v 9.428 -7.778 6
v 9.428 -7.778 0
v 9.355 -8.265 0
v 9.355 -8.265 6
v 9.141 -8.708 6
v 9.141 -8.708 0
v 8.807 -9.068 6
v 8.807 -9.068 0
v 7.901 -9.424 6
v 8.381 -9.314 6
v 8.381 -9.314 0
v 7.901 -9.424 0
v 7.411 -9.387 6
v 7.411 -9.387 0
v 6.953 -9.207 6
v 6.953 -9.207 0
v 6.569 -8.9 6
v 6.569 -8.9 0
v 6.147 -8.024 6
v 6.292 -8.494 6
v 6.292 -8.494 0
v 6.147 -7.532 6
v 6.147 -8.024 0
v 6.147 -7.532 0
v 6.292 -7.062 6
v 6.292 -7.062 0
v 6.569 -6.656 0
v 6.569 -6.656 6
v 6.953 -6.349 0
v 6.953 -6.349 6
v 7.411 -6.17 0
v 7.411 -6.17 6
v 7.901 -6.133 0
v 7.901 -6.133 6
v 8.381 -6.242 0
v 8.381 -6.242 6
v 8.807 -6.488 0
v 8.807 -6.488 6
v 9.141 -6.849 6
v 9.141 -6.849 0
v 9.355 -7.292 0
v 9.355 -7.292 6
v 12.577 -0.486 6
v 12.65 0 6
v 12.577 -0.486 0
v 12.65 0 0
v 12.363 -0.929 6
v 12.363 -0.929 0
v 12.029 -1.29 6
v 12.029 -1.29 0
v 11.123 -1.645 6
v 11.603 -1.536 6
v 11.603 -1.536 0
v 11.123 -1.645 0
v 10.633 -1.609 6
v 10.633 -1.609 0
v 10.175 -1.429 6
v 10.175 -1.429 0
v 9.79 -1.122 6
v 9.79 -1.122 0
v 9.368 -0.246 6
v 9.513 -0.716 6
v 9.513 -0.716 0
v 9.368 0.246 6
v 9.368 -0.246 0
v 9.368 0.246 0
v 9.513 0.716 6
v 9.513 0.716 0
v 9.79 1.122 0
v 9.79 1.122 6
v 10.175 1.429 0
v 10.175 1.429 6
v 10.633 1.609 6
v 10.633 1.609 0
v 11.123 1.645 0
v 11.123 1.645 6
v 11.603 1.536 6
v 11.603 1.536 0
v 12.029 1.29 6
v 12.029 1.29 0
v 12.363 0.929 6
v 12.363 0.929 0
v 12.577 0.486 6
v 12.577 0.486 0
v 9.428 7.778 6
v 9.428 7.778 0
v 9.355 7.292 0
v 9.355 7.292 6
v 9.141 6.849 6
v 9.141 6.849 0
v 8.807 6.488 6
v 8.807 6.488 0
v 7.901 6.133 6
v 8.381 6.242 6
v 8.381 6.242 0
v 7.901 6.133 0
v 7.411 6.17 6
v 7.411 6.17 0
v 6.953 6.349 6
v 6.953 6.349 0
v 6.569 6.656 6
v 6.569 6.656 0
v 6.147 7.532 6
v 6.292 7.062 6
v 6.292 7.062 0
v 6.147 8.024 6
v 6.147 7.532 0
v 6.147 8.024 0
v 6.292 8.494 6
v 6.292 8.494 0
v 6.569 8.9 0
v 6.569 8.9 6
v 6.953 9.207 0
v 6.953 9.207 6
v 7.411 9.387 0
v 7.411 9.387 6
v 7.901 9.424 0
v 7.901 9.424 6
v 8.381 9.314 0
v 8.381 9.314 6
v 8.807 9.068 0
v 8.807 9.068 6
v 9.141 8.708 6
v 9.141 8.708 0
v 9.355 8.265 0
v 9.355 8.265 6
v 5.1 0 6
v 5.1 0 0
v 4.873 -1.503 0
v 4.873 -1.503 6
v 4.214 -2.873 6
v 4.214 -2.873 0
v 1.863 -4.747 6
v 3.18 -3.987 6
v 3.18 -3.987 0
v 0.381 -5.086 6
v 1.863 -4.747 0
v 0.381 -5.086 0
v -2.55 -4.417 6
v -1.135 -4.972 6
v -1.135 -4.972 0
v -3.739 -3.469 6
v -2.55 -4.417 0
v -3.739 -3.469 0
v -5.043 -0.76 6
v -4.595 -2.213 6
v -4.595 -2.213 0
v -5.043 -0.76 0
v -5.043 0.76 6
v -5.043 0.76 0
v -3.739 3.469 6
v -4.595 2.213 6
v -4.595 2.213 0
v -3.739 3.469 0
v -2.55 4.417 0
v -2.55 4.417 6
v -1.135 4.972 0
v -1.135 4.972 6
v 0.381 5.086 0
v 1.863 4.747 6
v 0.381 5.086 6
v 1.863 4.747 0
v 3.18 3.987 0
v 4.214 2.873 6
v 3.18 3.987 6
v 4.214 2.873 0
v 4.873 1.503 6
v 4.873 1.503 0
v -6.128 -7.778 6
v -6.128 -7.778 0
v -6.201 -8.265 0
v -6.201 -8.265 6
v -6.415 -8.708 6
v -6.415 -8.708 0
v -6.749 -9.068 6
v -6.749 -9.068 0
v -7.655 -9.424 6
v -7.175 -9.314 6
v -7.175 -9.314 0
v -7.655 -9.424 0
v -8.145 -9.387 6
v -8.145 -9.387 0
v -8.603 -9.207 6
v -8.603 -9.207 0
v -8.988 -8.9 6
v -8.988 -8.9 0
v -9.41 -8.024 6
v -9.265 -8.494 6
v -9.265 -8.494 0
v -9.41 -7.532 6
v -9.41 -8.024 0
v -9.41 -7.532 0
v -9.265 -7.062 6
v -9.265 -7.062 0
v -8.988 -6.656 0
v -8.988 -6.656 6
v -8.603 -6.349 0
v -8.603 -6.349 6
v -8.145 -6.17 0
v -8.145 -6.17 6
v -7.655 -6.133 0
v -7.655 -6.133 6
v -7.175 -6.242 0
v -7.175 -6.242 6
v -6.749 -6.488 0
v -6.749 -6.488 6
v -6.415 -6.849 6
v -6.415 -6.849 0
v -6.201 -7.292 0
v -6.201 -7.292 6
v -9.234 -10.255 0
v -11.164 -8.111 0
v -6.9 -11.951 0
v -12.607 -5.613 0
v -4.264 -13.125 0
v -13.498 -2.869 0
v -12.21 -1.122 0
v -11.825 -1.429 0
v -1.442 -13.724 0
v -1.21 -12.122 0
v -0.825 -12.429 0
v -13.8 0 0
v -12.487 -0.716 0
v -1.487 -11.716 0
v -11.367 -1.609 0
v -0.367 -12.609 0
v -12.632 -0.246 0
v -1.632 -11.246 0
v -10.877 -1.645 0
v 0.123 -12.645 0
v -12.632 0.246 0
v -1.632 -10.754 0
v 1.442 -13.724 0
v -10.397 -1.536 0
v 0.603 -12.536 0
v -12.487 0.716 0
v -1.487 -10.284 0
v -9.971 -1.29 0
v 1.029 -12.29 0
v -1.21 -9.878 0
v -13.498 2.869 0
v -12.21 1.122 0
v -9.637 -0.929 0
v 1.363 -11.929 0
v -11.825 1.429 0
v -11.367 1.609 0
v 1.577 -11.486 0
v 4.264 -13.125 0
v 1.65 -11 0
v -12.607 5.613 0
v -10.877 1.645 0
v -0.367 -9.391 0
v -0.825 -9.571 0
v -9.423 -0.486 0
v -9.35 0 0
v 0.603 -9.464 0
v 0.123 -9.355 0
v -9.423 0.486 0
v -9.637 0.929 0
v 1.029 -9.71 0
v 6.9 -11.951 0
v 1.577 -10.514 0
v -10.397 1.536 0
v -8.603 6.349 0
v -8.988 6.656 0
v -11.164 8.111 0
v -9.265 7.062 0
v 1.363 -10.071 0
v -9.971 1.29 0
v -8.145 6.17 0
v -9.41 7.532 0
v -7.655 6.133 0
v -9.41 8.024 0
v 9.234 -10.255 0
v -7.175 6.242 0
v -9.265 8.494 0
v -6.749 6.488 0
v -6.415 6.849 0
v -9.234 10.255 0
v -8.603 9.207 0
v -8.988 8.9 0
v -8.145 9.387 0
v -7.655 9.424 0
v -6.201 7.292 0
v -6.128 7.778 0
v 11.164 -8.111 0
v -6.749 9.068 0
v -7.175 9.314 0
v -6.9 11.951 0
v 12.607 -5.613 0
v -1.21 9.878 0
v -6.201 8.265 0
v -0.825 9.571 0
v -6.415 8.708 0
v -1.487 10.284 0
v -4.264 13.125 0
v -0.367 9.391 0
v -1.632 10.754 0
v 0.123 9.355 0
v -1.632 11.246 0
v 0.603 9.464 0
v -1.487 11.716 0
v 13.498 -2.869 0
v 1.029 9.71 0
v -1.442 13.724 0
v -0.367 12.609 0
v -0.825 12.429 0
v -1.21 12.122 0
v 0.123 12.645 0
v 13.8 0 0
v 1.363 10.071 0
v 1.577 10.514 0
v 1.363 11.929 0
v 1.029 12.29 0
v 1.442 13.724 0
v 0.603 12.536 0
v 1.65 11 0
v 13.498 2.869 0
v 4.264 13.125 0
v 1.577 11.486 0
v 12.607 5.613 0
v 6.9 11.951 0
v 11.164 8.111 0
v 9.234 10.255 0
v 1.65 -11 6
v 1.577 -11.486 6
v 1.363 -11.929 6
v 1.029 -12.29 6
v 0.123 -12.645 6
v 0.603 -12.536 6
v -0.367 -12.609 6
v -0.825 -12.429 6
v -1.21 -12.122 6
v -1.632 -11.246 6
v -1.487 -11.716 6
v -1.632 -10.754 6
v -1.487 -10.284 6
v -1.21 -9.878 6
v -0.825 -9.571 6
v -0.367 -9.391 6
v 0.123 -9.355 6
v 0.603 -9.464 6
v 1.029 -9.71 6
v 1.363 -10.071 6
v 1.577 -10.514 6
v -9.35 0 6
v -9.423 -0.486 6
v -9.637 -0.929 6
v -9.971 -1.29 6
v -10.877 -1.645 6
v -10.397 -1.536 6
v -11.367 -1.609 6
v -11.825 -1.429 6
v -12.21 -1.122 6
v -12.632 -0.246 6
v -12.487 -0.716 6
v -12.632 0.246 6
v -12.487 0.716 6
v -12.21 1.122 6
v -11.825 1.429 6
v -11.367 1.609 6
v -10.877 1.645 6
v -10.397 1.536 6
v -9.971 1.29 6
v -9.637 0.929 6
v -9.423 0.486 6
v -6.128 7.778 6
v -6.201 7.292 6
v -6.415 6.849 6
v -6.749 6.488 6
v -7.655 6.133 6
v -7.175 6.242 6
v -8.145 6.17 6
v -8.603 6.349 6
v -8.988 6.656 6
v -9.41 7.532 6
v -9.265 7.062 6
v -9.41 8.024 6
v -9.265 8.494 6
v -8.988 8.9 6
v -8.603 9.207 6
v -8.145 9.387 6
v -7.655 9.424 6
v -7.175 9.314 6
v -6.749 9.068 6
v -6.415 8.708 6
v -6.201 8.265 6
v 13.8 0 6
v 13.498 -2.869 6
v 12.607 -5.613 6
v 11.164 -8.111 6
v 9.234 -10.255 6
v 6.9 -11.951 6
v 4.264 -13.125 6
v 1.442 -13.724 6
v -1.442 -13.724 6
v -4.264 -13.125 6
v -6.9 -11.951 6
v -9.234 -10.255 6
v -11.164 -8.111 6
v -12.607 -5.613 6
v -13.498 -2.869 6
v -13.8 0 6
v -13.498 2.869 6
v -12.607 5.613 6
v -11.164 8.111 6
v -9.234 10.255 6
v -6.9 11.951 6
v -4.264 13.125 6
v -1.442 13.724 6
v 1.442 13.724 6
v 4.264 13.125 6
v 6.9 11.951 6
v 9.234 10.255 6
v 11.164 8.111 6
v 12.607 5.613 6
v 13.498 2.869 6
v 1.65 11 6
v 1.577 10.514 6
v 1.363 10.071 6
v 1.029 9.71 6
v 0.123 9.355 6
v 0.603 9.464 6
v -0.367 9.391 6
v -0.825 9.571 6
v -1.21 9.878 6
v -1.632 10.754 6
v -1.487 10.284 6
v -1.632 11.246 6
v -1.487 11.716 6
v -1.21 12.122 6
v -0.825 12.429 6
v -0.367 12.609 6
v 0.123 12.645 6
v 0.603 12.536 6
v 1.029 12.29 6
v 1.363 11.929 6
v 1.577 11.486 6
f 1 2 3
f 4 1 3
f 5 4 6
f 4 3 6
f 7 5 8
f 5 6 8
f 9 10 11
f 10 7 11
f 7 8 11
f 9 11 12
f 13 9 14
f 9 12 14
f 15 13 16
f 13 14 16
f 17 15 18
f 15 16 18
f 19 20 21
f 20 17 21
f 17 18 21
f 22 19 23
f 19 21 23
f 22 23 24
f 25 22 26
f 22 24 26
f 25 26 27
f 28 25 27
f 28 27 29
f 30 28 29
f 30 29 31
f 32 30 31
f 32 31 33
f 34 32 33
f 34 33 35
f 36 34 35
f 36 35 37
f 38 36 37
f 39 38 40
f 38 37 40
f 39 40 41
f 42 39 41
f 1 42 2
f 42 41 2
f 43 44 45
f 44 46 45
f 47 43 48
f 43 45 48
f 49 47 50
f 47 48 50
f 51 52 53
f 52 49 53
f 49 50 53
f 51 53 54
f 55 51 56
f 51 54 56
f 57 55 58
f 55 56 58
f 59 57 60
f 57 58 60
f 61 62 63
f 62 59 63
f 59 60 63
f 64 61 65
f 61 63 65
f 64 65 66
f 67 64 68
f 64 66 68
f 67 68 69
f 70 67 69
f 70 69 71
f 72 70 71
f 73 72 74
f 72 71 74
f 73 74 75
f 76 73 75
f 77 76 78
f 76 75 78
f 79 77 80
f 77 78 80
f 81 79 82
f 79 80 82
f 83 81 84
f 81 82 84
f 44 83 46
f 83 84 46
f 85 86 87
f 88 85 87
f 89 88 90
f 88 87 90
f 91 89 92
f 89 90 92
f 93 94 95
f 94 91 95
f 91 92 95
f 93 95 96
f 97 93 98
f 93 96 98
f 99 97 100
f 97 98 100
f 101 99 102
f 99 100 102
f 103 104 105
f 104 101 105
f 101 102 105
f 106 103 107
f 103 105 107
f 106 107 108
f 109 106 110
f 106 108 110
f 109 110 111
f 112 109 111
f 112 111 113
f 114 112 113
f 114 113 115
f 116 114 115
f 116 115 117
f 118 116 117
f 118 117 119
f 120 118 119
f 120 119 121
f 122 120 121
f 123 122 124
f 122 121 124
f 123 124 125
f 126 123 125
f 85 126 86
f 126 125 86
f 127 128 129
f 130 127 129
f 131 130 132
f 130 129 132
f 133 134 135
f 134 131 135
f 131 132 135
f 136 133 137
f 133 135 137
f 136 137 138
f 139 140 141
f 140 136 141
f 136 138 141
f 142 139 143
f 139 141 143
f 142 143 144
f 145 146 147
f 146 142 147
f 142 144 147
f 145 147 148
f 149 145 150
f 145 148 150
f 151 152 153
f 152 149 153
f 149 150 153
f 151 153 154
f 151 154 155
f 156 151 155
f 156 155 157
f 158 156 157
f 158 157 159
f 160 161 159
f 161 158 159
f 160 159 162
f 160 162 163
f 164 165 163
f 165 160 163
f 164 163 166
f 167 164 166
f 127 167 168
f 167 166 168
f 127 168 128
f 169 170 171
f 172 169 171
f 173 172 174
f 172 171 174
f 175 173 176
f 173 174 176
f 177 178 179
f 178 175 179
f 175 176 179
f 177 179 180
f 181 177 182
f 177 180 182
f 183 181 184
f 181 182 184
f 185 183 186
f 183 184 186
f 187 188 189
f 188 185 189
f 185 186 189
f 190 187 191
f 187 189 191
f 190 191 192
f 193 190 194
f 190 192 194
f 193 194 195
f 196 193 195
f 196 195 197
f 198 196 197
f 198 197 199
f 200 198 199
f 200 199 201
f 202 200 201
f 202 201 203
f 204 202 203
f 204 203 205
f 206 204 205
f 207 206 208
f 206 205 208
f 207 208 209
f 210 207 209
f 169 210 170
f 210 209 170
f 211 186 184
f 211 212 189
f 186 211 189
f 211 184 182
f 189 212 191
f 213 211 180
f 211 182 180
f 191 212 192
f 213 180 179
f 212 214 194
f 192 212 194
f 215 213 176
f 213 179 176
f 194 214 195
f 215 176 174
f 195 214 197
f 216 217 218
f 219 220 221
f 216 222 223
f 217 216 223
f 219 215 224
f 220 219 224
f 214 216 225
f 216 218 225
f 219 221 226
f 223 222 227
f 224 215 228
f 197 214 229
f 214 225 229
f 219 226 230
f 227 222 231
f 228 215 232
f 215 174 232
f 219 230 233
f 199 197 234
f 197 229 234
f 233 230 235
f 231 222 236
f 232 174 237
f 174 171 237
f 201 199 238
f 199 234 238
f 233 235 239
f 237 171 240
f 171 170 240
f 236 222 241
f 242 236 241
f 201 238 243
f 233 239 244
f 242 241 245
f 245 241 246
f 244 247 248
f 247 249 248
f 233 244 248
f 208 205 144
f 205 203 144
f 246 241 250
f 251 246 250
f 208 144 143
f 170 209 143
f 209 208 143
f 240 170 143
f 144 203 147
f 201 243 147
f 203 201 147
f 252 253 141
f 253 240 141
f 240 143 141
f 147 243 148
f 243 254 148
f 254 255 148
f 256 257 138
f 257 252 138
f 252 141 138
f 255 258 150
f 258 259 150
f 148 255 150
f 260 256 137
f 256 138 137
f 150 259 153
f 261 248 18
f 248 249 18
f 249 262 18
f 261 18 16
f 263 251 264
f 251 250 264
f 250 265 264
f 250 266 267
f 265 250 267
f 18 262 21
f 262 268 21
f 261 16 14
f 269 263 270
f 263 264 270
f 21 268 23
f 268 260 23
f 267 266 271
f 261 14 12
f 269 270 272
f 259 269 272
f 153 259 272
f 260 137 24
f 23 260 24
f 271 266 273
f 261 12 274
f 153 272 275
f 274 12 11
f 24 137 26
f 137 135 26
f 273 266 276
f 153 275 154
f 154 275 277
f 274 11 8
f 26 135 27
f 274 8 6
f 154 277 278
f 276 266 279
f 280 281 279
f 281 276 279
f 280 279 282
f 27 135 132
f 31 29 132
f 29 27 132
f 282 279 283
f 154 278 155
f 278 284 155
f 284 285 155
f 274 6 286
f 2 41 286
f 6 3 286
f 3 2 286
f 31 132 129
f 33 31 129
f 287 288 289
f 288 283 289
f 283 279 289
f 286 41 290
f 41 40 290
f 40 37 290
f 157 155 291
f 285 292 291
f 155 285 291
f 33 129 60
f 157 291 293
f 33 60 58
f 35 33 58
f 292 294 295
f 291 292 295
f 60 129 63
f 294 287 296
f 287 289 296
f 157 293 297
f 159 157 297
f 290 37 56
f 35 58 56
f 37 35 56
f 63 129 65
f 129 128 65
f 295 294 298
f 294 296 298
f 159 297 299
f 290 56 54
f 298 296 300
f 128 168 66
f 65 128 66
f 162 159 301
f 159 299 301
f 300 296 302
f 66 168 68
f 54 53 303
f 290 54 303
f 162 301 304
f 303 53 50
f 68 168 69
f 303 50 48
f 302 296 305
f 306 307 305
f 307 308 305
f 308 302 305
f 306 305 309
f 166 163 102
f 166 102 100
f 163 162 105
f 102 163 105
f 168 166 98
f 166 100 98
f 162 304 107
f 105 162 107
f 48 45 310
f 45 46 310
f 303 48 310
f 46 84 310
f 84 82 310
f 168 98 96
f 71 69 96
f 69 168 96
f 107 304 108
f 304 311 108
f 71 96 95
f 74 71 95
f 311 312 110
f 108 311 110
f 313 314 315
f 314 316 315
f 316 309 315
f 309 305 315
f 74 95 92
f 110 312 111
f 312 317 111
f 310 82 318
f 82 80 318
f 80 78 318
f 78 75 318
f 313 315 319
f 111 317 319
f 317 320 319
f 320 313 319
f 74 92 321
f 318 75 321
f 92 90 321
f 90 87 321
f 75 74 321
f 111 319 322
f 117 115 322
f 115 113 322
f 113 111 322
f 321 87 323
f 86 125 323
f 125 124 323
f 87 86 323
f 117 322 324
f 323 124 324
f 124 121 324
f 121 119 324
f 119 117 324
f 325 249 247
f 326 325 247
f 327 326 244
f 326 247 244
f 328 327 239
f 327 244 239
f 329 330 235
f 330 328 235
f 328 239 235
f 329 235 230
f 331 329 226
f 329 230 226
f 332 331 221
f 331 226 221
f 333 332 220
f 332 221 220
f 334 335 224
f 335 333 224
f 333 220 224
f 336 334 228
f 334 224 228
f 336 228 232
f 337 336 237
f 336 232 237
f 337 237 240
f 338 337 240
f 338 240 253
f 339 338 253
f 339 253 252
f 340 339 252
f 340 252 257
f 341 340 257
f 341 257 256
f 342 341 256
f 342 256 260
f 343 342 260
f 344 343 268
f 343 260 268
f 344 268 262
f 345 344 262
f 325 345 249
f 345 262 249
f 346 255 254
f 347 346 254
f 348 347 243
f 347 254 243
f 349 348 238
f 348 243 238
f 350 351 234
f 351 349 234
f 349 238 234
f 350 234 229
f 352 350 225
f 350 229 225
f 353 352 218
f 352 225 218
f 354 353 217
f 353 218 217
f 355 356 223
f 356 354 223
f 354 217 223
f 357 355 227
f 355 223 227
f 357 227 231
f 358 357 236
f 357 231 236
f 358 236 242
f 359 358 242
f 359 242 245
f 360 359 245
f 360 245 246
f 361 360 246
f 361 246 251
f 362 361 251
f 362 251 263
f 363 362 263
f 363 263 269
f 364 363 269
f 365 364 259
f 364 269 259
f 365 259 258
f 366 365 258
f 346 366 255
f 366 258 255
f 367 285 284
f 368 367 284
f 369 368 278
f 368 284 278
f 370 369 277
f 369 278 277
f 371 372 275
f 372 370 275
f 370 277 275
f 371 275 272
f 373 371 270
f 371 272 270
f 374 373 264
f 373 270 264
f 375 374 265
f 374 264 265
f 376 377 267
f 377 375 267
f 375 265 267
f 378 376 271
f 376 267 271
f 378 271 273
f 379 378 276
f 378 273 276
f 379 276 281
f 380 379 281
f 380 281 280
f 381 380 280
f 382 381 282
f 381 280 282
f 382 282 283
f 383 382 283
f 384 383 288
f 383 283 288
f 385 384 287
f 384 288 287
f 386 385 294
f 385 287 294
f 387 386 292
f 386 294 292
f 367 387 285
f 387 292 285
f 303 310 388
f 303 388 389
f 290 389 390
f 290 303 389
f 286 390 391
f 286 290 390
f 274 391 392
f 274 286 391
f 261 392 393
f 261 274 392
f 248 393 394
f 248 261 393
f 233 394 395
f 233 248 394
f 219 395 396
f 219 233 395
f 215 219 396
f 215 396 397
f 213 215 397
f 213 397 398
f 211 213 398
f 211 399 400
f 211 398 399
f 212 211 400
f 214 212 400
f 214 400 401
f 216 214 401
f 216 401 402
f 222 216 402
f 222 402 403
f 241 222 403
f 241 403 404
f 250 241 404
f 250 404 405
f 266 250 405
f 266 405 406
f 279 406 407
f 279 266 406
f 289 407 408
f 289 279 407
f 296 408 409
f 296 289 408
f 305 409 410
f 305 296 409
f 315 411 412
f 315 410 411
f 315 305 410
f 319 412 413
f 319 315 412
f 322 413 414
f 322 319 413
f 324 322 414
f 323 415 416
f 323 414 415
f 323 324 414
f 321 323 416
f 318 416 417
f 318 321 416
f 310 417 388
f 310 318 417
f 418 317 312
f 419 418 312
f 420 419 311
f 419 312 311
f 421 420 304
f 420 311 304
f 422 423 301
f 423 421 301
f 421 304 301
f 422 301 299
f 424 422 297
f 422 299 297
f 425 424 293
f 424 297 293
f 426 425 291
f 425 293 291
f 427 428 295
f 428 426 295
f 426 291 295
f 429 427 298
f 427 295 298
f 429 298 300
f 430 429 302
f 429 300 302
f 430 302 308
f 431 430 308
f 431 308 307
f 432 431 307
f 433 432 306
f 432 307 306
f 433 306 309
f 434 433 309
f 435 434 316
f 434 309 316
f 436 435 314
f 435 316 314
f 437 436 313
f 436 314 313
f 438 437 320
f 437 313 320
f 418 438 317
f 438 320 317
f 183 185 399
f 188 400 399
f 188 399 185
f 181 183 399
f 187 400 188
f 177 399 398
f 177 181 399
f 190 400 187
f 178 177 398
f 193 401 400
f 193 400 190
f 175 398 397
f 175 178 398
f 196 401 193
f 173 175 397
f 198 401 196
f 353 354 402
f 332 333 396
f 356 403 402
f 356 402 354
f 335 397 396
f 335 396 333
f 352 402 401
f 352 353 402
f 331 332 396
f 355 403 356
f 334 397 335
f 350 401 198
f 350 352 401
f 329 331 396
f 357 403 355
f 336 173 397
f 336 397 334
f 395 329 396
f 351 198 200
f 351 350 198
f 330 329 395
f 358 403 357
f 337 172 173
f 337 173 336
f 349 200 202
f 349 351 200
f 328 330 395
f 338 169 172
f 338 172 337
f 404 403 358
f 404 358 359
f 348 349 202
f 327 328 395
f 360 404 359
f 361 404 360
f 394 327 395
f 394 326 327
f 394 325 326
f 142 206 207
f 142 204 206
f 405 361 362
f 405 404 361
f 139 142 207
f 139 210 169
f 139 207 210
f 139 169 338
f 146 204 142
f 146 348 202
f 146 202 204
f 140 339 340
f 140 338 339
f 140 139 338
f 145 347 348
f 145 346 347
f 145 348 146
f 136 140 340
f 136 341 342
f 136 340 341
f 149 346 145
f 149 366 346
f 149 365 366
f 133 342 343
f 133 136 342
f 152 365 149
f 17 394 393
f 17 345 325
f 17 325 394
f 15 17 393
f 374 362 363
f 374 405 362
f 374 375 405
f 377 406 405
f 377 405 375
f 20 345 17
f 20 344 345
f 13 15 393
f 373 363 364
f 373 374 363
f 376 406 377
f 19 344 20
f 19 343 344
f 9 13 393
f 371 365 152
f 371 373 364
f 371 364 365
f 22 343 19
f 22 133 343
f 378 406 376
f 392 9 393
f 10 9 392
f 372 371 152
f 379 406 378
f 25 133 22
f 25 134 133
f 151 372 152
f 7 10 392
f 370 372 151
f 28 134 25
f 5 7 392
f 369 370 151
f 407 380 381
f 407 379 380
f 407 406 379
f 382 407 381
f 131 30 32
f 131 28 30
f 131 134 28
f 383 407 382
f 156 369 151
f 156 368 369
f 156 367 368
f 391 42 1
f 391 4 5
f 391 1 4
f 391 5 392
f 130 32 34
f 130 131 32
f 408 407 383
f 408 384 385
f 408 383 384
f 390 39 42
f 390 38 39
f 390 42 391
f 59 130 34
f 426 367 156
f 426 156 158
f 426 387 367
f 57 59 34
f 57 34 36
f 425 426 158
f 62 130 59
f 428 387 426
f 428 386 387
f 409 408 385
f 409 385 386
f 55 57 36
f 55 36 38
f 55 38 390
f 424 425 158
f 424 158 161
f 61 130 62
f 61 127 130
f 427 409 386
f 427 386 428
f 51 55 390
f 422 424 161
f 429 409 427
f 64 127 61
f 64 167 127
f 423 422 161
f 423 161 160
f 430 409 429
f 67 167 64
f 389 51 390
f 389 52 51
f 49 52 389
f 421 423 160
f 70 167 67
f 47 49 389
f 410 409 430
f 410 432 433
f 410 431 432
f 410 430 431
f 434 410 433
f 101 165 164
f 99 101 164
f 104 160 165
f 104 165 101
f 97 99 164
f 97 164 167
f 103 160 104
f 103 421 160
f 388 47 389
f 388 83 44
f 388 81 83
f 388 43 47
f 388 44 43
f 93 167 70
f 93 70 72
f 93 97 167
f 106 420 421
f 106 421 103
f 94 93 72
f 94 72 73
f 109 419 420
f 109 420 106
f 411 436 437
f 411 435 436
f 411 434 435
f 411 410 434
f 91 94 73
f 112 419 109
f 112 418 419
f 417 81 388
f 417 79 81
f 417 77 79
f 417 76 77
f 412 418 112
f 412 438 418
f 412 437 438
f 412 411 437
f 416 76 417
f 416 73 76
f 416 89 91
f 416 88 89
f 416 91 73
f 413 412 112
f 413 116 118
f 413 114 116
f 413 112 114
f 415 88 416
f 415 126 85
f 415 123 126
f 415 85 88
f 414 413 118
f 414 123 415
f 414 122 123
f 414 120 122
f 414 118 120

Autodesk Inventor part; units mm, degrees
ref_plane "YZ Plane" through (0, 0, 0) normal (1, 0, 0) x (0, 1, 0)
ref_plane "XZ Plane" through (0, 0, 0) normal (0, 1, 0) x (-1, 0, 0)
ref_plane "XY Plane" through (0, 0, 0) normal (0, 0, 1) x (1, 0, 0)
ref_plane "작업 평면1" through (0, 0, 0) normal (0, 0, 1) x (1, 0, 0)
sketch "스케치1" plane through (0, 0, 0) normal (0, 0, 1) x (1, 0, 0)
  circle A0 centre (-7.778175, -7.778175) radius 1.55
  circle A1 centre (7.778175, -7.778175) radius 1.55
  circle A2 centre (7.778175, 7.778175) radius 1.55
  circle A3 centre (-7.778175, 7.778175) radius 1.55
  circle A4 centre (0, 0) radius 5
  circle A5 centre (0, 0) radius 13.9
  circle A6 centre (0, 11) radius 1.55
  circle A7 centre (11, 0) radius 1.55
  circle A8 centre (0, -11) radius 1.55
  circle A9 centre (-11, 0) radius 1.55
  circle A10 centre (-11, 0) radius 1.65
  circle A11 centre (-7.778175, 7.778175) radius 1.65
  circle A12 centre (0, 11) radius 1.65
  circle A13 centre (7.778175, 7.778175) radius 1.65
  circle A14 centre (11, 0) radius 1.65
  circle A15 centre (7.778175, -7.778175) radius 1.65
  circle A16 centre (0, -11) radius 1.65
  circle A17 centre (-7.778175, -7.778175) radius 1.65
  circle A18 centre (0, 0) radius 5.1
  circle A19 centre (0, 0) radius 13.8
  point P0 (0, 0)
  dimension "d0" = 0.1
  dimension "d1" = 0.1
  dimension "d2" = 0.1
  dimension "d3" = 0.1
  dimension "d4" = 0.1
  dimension "d5" = 0.1
  dimension "d6" = 0.1
  dimension "d7" = 0.1
  dimension "d8" = 0.1
  dimension "d9" = 0.1
sketch "스케치1 outline for 돌출1" plane through (0, 0, 0) normal (0, 0, 1) x (1, 0, 0)
  circle A0 centre (0, 0) radius 13.8
  circle A1 centre (-7.778175, -7.778175) radius 1.65
  circle A2 centre (-11, 0) radius 1.65
  circle A3 centre (0, -11) radius 1.65
  circle A4 centre (7.778175, -7.778175) radius 1.65
  circle A5 centre (0, 0) radius 5.1
  circle A6 centre (11, 0) radius 1.65
  circle A7 centre (-7.778175, 7.778175) radius 1.65
  circle A8 centre (0, 11) radius 1.65
  circle A9 centre (7.778175, 7.778175) radius 1.65
extrude "돌출1" add sketch "스케치1 outline for 돌출1" along normal blind 6
properties part number "25" material "아크릴, 선명"
